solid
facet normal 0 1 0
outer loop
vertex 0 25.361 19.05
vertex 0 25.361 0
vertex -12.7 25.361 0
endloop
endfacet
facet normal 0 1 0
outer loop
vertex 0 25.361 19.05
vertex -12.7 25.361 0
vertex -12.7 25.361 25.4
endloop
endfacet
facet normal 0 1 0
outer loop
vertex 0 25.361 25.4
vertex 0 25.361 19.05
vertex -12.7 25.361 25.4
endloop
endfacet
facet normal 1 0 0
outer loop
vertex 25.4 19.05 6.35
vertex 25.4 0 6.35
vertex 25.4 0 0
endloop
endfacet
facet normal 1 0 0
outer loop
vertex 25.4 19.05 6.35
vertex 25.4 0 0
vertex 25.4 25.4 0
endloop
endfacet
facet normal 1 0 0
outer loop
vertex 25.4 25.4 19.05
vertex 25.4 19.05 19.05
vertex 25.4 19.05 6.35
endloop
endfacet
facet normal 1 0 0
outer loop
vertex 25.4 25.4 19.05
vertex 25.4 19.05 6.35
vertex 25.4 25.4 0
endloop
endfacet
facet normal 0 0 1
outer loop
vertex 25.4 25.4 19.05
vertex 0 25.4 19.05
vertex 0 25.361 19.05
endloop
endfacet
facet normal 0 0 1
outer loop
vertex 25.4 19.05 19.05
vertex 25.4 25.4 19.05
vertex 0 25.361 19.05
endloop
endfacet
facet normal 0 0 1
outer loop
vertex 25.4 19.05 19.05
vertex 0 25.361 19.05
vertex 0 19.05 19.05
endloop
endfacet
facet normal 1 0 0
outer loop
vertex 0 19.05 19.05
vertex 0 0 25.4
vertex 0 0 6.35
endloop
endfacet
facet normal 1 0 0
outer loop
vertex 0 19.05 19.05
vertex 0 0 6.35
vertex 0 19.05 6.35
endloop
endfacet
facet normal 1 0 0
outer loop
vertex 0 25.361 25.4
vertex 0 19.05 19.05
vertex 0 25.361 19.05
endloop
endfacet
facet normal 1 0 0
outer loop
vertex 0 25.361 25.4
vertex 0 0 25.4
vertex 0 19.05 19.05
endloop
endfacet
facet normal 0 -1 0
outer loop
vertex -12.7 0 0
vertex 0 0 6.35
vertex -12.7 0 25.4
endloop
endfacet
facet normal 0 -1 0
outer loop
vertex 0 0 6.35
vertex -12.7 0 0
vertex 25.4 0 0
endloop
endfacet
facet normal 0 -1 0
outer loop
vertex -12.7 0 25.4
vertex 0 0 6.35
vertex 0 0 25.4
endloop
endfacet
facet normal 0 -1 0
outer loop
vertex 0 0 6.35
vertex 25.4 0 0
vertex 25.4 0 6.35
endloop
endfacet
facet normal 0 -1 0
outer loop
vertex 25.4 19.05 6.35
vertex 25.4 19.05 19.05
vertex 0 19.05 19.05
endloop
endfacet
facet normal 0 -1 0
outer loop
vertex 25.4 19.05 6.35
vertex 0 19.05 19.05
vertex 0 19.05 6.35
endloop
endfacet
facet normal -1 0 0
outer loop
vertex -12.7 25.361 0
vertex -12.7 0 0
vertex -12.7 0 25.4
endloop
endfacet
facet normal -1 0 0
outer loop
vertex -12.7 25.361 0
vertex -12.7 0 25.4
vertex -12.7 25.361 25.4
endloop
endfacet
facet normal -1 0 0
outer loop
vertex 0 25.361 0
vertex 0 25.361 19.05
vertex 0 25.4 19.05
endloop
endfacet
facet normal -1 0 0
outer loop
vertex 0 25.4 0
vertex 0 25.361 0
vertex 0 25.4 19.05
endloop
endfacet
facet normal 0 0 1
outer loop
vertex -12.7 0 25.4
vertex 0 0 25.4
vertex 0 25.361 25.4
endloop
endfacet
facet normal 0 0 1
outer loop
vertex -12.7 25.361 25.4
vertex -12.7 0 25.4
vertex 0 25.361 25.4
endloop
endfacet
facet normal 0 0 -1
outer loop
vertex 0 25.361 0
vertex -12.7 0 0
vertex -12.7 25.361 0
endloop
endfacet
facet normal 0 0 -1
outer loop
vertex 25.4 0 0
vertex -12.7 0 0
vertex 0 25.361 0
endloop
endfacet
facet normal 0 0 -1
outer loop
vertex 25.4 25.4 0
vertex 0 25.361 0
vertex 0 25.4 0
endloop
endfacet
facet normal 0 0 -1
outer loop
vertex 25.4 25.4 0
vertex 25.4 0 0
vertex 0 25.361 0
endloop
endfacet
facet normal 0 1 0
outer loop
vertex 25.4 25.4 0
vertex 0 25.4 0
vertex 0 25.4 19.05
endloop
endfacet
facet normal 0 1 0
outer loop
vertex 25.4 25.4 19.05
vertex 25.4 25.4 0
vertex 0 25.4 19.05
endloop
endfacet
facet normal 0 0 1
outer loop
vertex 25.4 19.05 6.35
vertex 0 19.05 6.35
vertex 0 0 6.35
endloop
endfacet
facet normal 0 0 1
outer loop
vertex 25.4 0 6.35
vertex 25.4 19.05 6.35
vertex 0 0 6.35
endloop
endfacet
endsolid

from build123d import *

# Parameters (mm, degrees)
F1_DEPTH = 25.4
F2_W     = 25.360864
F2_H     = 25.4
F3_DEPTH = 12.7


with BuildPart() as f1:
    # F0 (on Right) → F1 (new body)
    with BuildSketch(Plane.YZ):
        Polygon((0, 6.35), (0, 0), (25.4, 0), (25.4, 19.05), (19.05, 19.05), (19.05, 6.35), align=None)
    extrude(amount=F1_DEPTH)

    # F2 (on Right) → F3 (join)
    with BuildSketch(Plane.YZ):
        with Locations((12.680432, 12.7)):
            Rectangle(F2_W, F2_H)
    extrude(amount=-F3_DEPTH)


solid = f1.part
